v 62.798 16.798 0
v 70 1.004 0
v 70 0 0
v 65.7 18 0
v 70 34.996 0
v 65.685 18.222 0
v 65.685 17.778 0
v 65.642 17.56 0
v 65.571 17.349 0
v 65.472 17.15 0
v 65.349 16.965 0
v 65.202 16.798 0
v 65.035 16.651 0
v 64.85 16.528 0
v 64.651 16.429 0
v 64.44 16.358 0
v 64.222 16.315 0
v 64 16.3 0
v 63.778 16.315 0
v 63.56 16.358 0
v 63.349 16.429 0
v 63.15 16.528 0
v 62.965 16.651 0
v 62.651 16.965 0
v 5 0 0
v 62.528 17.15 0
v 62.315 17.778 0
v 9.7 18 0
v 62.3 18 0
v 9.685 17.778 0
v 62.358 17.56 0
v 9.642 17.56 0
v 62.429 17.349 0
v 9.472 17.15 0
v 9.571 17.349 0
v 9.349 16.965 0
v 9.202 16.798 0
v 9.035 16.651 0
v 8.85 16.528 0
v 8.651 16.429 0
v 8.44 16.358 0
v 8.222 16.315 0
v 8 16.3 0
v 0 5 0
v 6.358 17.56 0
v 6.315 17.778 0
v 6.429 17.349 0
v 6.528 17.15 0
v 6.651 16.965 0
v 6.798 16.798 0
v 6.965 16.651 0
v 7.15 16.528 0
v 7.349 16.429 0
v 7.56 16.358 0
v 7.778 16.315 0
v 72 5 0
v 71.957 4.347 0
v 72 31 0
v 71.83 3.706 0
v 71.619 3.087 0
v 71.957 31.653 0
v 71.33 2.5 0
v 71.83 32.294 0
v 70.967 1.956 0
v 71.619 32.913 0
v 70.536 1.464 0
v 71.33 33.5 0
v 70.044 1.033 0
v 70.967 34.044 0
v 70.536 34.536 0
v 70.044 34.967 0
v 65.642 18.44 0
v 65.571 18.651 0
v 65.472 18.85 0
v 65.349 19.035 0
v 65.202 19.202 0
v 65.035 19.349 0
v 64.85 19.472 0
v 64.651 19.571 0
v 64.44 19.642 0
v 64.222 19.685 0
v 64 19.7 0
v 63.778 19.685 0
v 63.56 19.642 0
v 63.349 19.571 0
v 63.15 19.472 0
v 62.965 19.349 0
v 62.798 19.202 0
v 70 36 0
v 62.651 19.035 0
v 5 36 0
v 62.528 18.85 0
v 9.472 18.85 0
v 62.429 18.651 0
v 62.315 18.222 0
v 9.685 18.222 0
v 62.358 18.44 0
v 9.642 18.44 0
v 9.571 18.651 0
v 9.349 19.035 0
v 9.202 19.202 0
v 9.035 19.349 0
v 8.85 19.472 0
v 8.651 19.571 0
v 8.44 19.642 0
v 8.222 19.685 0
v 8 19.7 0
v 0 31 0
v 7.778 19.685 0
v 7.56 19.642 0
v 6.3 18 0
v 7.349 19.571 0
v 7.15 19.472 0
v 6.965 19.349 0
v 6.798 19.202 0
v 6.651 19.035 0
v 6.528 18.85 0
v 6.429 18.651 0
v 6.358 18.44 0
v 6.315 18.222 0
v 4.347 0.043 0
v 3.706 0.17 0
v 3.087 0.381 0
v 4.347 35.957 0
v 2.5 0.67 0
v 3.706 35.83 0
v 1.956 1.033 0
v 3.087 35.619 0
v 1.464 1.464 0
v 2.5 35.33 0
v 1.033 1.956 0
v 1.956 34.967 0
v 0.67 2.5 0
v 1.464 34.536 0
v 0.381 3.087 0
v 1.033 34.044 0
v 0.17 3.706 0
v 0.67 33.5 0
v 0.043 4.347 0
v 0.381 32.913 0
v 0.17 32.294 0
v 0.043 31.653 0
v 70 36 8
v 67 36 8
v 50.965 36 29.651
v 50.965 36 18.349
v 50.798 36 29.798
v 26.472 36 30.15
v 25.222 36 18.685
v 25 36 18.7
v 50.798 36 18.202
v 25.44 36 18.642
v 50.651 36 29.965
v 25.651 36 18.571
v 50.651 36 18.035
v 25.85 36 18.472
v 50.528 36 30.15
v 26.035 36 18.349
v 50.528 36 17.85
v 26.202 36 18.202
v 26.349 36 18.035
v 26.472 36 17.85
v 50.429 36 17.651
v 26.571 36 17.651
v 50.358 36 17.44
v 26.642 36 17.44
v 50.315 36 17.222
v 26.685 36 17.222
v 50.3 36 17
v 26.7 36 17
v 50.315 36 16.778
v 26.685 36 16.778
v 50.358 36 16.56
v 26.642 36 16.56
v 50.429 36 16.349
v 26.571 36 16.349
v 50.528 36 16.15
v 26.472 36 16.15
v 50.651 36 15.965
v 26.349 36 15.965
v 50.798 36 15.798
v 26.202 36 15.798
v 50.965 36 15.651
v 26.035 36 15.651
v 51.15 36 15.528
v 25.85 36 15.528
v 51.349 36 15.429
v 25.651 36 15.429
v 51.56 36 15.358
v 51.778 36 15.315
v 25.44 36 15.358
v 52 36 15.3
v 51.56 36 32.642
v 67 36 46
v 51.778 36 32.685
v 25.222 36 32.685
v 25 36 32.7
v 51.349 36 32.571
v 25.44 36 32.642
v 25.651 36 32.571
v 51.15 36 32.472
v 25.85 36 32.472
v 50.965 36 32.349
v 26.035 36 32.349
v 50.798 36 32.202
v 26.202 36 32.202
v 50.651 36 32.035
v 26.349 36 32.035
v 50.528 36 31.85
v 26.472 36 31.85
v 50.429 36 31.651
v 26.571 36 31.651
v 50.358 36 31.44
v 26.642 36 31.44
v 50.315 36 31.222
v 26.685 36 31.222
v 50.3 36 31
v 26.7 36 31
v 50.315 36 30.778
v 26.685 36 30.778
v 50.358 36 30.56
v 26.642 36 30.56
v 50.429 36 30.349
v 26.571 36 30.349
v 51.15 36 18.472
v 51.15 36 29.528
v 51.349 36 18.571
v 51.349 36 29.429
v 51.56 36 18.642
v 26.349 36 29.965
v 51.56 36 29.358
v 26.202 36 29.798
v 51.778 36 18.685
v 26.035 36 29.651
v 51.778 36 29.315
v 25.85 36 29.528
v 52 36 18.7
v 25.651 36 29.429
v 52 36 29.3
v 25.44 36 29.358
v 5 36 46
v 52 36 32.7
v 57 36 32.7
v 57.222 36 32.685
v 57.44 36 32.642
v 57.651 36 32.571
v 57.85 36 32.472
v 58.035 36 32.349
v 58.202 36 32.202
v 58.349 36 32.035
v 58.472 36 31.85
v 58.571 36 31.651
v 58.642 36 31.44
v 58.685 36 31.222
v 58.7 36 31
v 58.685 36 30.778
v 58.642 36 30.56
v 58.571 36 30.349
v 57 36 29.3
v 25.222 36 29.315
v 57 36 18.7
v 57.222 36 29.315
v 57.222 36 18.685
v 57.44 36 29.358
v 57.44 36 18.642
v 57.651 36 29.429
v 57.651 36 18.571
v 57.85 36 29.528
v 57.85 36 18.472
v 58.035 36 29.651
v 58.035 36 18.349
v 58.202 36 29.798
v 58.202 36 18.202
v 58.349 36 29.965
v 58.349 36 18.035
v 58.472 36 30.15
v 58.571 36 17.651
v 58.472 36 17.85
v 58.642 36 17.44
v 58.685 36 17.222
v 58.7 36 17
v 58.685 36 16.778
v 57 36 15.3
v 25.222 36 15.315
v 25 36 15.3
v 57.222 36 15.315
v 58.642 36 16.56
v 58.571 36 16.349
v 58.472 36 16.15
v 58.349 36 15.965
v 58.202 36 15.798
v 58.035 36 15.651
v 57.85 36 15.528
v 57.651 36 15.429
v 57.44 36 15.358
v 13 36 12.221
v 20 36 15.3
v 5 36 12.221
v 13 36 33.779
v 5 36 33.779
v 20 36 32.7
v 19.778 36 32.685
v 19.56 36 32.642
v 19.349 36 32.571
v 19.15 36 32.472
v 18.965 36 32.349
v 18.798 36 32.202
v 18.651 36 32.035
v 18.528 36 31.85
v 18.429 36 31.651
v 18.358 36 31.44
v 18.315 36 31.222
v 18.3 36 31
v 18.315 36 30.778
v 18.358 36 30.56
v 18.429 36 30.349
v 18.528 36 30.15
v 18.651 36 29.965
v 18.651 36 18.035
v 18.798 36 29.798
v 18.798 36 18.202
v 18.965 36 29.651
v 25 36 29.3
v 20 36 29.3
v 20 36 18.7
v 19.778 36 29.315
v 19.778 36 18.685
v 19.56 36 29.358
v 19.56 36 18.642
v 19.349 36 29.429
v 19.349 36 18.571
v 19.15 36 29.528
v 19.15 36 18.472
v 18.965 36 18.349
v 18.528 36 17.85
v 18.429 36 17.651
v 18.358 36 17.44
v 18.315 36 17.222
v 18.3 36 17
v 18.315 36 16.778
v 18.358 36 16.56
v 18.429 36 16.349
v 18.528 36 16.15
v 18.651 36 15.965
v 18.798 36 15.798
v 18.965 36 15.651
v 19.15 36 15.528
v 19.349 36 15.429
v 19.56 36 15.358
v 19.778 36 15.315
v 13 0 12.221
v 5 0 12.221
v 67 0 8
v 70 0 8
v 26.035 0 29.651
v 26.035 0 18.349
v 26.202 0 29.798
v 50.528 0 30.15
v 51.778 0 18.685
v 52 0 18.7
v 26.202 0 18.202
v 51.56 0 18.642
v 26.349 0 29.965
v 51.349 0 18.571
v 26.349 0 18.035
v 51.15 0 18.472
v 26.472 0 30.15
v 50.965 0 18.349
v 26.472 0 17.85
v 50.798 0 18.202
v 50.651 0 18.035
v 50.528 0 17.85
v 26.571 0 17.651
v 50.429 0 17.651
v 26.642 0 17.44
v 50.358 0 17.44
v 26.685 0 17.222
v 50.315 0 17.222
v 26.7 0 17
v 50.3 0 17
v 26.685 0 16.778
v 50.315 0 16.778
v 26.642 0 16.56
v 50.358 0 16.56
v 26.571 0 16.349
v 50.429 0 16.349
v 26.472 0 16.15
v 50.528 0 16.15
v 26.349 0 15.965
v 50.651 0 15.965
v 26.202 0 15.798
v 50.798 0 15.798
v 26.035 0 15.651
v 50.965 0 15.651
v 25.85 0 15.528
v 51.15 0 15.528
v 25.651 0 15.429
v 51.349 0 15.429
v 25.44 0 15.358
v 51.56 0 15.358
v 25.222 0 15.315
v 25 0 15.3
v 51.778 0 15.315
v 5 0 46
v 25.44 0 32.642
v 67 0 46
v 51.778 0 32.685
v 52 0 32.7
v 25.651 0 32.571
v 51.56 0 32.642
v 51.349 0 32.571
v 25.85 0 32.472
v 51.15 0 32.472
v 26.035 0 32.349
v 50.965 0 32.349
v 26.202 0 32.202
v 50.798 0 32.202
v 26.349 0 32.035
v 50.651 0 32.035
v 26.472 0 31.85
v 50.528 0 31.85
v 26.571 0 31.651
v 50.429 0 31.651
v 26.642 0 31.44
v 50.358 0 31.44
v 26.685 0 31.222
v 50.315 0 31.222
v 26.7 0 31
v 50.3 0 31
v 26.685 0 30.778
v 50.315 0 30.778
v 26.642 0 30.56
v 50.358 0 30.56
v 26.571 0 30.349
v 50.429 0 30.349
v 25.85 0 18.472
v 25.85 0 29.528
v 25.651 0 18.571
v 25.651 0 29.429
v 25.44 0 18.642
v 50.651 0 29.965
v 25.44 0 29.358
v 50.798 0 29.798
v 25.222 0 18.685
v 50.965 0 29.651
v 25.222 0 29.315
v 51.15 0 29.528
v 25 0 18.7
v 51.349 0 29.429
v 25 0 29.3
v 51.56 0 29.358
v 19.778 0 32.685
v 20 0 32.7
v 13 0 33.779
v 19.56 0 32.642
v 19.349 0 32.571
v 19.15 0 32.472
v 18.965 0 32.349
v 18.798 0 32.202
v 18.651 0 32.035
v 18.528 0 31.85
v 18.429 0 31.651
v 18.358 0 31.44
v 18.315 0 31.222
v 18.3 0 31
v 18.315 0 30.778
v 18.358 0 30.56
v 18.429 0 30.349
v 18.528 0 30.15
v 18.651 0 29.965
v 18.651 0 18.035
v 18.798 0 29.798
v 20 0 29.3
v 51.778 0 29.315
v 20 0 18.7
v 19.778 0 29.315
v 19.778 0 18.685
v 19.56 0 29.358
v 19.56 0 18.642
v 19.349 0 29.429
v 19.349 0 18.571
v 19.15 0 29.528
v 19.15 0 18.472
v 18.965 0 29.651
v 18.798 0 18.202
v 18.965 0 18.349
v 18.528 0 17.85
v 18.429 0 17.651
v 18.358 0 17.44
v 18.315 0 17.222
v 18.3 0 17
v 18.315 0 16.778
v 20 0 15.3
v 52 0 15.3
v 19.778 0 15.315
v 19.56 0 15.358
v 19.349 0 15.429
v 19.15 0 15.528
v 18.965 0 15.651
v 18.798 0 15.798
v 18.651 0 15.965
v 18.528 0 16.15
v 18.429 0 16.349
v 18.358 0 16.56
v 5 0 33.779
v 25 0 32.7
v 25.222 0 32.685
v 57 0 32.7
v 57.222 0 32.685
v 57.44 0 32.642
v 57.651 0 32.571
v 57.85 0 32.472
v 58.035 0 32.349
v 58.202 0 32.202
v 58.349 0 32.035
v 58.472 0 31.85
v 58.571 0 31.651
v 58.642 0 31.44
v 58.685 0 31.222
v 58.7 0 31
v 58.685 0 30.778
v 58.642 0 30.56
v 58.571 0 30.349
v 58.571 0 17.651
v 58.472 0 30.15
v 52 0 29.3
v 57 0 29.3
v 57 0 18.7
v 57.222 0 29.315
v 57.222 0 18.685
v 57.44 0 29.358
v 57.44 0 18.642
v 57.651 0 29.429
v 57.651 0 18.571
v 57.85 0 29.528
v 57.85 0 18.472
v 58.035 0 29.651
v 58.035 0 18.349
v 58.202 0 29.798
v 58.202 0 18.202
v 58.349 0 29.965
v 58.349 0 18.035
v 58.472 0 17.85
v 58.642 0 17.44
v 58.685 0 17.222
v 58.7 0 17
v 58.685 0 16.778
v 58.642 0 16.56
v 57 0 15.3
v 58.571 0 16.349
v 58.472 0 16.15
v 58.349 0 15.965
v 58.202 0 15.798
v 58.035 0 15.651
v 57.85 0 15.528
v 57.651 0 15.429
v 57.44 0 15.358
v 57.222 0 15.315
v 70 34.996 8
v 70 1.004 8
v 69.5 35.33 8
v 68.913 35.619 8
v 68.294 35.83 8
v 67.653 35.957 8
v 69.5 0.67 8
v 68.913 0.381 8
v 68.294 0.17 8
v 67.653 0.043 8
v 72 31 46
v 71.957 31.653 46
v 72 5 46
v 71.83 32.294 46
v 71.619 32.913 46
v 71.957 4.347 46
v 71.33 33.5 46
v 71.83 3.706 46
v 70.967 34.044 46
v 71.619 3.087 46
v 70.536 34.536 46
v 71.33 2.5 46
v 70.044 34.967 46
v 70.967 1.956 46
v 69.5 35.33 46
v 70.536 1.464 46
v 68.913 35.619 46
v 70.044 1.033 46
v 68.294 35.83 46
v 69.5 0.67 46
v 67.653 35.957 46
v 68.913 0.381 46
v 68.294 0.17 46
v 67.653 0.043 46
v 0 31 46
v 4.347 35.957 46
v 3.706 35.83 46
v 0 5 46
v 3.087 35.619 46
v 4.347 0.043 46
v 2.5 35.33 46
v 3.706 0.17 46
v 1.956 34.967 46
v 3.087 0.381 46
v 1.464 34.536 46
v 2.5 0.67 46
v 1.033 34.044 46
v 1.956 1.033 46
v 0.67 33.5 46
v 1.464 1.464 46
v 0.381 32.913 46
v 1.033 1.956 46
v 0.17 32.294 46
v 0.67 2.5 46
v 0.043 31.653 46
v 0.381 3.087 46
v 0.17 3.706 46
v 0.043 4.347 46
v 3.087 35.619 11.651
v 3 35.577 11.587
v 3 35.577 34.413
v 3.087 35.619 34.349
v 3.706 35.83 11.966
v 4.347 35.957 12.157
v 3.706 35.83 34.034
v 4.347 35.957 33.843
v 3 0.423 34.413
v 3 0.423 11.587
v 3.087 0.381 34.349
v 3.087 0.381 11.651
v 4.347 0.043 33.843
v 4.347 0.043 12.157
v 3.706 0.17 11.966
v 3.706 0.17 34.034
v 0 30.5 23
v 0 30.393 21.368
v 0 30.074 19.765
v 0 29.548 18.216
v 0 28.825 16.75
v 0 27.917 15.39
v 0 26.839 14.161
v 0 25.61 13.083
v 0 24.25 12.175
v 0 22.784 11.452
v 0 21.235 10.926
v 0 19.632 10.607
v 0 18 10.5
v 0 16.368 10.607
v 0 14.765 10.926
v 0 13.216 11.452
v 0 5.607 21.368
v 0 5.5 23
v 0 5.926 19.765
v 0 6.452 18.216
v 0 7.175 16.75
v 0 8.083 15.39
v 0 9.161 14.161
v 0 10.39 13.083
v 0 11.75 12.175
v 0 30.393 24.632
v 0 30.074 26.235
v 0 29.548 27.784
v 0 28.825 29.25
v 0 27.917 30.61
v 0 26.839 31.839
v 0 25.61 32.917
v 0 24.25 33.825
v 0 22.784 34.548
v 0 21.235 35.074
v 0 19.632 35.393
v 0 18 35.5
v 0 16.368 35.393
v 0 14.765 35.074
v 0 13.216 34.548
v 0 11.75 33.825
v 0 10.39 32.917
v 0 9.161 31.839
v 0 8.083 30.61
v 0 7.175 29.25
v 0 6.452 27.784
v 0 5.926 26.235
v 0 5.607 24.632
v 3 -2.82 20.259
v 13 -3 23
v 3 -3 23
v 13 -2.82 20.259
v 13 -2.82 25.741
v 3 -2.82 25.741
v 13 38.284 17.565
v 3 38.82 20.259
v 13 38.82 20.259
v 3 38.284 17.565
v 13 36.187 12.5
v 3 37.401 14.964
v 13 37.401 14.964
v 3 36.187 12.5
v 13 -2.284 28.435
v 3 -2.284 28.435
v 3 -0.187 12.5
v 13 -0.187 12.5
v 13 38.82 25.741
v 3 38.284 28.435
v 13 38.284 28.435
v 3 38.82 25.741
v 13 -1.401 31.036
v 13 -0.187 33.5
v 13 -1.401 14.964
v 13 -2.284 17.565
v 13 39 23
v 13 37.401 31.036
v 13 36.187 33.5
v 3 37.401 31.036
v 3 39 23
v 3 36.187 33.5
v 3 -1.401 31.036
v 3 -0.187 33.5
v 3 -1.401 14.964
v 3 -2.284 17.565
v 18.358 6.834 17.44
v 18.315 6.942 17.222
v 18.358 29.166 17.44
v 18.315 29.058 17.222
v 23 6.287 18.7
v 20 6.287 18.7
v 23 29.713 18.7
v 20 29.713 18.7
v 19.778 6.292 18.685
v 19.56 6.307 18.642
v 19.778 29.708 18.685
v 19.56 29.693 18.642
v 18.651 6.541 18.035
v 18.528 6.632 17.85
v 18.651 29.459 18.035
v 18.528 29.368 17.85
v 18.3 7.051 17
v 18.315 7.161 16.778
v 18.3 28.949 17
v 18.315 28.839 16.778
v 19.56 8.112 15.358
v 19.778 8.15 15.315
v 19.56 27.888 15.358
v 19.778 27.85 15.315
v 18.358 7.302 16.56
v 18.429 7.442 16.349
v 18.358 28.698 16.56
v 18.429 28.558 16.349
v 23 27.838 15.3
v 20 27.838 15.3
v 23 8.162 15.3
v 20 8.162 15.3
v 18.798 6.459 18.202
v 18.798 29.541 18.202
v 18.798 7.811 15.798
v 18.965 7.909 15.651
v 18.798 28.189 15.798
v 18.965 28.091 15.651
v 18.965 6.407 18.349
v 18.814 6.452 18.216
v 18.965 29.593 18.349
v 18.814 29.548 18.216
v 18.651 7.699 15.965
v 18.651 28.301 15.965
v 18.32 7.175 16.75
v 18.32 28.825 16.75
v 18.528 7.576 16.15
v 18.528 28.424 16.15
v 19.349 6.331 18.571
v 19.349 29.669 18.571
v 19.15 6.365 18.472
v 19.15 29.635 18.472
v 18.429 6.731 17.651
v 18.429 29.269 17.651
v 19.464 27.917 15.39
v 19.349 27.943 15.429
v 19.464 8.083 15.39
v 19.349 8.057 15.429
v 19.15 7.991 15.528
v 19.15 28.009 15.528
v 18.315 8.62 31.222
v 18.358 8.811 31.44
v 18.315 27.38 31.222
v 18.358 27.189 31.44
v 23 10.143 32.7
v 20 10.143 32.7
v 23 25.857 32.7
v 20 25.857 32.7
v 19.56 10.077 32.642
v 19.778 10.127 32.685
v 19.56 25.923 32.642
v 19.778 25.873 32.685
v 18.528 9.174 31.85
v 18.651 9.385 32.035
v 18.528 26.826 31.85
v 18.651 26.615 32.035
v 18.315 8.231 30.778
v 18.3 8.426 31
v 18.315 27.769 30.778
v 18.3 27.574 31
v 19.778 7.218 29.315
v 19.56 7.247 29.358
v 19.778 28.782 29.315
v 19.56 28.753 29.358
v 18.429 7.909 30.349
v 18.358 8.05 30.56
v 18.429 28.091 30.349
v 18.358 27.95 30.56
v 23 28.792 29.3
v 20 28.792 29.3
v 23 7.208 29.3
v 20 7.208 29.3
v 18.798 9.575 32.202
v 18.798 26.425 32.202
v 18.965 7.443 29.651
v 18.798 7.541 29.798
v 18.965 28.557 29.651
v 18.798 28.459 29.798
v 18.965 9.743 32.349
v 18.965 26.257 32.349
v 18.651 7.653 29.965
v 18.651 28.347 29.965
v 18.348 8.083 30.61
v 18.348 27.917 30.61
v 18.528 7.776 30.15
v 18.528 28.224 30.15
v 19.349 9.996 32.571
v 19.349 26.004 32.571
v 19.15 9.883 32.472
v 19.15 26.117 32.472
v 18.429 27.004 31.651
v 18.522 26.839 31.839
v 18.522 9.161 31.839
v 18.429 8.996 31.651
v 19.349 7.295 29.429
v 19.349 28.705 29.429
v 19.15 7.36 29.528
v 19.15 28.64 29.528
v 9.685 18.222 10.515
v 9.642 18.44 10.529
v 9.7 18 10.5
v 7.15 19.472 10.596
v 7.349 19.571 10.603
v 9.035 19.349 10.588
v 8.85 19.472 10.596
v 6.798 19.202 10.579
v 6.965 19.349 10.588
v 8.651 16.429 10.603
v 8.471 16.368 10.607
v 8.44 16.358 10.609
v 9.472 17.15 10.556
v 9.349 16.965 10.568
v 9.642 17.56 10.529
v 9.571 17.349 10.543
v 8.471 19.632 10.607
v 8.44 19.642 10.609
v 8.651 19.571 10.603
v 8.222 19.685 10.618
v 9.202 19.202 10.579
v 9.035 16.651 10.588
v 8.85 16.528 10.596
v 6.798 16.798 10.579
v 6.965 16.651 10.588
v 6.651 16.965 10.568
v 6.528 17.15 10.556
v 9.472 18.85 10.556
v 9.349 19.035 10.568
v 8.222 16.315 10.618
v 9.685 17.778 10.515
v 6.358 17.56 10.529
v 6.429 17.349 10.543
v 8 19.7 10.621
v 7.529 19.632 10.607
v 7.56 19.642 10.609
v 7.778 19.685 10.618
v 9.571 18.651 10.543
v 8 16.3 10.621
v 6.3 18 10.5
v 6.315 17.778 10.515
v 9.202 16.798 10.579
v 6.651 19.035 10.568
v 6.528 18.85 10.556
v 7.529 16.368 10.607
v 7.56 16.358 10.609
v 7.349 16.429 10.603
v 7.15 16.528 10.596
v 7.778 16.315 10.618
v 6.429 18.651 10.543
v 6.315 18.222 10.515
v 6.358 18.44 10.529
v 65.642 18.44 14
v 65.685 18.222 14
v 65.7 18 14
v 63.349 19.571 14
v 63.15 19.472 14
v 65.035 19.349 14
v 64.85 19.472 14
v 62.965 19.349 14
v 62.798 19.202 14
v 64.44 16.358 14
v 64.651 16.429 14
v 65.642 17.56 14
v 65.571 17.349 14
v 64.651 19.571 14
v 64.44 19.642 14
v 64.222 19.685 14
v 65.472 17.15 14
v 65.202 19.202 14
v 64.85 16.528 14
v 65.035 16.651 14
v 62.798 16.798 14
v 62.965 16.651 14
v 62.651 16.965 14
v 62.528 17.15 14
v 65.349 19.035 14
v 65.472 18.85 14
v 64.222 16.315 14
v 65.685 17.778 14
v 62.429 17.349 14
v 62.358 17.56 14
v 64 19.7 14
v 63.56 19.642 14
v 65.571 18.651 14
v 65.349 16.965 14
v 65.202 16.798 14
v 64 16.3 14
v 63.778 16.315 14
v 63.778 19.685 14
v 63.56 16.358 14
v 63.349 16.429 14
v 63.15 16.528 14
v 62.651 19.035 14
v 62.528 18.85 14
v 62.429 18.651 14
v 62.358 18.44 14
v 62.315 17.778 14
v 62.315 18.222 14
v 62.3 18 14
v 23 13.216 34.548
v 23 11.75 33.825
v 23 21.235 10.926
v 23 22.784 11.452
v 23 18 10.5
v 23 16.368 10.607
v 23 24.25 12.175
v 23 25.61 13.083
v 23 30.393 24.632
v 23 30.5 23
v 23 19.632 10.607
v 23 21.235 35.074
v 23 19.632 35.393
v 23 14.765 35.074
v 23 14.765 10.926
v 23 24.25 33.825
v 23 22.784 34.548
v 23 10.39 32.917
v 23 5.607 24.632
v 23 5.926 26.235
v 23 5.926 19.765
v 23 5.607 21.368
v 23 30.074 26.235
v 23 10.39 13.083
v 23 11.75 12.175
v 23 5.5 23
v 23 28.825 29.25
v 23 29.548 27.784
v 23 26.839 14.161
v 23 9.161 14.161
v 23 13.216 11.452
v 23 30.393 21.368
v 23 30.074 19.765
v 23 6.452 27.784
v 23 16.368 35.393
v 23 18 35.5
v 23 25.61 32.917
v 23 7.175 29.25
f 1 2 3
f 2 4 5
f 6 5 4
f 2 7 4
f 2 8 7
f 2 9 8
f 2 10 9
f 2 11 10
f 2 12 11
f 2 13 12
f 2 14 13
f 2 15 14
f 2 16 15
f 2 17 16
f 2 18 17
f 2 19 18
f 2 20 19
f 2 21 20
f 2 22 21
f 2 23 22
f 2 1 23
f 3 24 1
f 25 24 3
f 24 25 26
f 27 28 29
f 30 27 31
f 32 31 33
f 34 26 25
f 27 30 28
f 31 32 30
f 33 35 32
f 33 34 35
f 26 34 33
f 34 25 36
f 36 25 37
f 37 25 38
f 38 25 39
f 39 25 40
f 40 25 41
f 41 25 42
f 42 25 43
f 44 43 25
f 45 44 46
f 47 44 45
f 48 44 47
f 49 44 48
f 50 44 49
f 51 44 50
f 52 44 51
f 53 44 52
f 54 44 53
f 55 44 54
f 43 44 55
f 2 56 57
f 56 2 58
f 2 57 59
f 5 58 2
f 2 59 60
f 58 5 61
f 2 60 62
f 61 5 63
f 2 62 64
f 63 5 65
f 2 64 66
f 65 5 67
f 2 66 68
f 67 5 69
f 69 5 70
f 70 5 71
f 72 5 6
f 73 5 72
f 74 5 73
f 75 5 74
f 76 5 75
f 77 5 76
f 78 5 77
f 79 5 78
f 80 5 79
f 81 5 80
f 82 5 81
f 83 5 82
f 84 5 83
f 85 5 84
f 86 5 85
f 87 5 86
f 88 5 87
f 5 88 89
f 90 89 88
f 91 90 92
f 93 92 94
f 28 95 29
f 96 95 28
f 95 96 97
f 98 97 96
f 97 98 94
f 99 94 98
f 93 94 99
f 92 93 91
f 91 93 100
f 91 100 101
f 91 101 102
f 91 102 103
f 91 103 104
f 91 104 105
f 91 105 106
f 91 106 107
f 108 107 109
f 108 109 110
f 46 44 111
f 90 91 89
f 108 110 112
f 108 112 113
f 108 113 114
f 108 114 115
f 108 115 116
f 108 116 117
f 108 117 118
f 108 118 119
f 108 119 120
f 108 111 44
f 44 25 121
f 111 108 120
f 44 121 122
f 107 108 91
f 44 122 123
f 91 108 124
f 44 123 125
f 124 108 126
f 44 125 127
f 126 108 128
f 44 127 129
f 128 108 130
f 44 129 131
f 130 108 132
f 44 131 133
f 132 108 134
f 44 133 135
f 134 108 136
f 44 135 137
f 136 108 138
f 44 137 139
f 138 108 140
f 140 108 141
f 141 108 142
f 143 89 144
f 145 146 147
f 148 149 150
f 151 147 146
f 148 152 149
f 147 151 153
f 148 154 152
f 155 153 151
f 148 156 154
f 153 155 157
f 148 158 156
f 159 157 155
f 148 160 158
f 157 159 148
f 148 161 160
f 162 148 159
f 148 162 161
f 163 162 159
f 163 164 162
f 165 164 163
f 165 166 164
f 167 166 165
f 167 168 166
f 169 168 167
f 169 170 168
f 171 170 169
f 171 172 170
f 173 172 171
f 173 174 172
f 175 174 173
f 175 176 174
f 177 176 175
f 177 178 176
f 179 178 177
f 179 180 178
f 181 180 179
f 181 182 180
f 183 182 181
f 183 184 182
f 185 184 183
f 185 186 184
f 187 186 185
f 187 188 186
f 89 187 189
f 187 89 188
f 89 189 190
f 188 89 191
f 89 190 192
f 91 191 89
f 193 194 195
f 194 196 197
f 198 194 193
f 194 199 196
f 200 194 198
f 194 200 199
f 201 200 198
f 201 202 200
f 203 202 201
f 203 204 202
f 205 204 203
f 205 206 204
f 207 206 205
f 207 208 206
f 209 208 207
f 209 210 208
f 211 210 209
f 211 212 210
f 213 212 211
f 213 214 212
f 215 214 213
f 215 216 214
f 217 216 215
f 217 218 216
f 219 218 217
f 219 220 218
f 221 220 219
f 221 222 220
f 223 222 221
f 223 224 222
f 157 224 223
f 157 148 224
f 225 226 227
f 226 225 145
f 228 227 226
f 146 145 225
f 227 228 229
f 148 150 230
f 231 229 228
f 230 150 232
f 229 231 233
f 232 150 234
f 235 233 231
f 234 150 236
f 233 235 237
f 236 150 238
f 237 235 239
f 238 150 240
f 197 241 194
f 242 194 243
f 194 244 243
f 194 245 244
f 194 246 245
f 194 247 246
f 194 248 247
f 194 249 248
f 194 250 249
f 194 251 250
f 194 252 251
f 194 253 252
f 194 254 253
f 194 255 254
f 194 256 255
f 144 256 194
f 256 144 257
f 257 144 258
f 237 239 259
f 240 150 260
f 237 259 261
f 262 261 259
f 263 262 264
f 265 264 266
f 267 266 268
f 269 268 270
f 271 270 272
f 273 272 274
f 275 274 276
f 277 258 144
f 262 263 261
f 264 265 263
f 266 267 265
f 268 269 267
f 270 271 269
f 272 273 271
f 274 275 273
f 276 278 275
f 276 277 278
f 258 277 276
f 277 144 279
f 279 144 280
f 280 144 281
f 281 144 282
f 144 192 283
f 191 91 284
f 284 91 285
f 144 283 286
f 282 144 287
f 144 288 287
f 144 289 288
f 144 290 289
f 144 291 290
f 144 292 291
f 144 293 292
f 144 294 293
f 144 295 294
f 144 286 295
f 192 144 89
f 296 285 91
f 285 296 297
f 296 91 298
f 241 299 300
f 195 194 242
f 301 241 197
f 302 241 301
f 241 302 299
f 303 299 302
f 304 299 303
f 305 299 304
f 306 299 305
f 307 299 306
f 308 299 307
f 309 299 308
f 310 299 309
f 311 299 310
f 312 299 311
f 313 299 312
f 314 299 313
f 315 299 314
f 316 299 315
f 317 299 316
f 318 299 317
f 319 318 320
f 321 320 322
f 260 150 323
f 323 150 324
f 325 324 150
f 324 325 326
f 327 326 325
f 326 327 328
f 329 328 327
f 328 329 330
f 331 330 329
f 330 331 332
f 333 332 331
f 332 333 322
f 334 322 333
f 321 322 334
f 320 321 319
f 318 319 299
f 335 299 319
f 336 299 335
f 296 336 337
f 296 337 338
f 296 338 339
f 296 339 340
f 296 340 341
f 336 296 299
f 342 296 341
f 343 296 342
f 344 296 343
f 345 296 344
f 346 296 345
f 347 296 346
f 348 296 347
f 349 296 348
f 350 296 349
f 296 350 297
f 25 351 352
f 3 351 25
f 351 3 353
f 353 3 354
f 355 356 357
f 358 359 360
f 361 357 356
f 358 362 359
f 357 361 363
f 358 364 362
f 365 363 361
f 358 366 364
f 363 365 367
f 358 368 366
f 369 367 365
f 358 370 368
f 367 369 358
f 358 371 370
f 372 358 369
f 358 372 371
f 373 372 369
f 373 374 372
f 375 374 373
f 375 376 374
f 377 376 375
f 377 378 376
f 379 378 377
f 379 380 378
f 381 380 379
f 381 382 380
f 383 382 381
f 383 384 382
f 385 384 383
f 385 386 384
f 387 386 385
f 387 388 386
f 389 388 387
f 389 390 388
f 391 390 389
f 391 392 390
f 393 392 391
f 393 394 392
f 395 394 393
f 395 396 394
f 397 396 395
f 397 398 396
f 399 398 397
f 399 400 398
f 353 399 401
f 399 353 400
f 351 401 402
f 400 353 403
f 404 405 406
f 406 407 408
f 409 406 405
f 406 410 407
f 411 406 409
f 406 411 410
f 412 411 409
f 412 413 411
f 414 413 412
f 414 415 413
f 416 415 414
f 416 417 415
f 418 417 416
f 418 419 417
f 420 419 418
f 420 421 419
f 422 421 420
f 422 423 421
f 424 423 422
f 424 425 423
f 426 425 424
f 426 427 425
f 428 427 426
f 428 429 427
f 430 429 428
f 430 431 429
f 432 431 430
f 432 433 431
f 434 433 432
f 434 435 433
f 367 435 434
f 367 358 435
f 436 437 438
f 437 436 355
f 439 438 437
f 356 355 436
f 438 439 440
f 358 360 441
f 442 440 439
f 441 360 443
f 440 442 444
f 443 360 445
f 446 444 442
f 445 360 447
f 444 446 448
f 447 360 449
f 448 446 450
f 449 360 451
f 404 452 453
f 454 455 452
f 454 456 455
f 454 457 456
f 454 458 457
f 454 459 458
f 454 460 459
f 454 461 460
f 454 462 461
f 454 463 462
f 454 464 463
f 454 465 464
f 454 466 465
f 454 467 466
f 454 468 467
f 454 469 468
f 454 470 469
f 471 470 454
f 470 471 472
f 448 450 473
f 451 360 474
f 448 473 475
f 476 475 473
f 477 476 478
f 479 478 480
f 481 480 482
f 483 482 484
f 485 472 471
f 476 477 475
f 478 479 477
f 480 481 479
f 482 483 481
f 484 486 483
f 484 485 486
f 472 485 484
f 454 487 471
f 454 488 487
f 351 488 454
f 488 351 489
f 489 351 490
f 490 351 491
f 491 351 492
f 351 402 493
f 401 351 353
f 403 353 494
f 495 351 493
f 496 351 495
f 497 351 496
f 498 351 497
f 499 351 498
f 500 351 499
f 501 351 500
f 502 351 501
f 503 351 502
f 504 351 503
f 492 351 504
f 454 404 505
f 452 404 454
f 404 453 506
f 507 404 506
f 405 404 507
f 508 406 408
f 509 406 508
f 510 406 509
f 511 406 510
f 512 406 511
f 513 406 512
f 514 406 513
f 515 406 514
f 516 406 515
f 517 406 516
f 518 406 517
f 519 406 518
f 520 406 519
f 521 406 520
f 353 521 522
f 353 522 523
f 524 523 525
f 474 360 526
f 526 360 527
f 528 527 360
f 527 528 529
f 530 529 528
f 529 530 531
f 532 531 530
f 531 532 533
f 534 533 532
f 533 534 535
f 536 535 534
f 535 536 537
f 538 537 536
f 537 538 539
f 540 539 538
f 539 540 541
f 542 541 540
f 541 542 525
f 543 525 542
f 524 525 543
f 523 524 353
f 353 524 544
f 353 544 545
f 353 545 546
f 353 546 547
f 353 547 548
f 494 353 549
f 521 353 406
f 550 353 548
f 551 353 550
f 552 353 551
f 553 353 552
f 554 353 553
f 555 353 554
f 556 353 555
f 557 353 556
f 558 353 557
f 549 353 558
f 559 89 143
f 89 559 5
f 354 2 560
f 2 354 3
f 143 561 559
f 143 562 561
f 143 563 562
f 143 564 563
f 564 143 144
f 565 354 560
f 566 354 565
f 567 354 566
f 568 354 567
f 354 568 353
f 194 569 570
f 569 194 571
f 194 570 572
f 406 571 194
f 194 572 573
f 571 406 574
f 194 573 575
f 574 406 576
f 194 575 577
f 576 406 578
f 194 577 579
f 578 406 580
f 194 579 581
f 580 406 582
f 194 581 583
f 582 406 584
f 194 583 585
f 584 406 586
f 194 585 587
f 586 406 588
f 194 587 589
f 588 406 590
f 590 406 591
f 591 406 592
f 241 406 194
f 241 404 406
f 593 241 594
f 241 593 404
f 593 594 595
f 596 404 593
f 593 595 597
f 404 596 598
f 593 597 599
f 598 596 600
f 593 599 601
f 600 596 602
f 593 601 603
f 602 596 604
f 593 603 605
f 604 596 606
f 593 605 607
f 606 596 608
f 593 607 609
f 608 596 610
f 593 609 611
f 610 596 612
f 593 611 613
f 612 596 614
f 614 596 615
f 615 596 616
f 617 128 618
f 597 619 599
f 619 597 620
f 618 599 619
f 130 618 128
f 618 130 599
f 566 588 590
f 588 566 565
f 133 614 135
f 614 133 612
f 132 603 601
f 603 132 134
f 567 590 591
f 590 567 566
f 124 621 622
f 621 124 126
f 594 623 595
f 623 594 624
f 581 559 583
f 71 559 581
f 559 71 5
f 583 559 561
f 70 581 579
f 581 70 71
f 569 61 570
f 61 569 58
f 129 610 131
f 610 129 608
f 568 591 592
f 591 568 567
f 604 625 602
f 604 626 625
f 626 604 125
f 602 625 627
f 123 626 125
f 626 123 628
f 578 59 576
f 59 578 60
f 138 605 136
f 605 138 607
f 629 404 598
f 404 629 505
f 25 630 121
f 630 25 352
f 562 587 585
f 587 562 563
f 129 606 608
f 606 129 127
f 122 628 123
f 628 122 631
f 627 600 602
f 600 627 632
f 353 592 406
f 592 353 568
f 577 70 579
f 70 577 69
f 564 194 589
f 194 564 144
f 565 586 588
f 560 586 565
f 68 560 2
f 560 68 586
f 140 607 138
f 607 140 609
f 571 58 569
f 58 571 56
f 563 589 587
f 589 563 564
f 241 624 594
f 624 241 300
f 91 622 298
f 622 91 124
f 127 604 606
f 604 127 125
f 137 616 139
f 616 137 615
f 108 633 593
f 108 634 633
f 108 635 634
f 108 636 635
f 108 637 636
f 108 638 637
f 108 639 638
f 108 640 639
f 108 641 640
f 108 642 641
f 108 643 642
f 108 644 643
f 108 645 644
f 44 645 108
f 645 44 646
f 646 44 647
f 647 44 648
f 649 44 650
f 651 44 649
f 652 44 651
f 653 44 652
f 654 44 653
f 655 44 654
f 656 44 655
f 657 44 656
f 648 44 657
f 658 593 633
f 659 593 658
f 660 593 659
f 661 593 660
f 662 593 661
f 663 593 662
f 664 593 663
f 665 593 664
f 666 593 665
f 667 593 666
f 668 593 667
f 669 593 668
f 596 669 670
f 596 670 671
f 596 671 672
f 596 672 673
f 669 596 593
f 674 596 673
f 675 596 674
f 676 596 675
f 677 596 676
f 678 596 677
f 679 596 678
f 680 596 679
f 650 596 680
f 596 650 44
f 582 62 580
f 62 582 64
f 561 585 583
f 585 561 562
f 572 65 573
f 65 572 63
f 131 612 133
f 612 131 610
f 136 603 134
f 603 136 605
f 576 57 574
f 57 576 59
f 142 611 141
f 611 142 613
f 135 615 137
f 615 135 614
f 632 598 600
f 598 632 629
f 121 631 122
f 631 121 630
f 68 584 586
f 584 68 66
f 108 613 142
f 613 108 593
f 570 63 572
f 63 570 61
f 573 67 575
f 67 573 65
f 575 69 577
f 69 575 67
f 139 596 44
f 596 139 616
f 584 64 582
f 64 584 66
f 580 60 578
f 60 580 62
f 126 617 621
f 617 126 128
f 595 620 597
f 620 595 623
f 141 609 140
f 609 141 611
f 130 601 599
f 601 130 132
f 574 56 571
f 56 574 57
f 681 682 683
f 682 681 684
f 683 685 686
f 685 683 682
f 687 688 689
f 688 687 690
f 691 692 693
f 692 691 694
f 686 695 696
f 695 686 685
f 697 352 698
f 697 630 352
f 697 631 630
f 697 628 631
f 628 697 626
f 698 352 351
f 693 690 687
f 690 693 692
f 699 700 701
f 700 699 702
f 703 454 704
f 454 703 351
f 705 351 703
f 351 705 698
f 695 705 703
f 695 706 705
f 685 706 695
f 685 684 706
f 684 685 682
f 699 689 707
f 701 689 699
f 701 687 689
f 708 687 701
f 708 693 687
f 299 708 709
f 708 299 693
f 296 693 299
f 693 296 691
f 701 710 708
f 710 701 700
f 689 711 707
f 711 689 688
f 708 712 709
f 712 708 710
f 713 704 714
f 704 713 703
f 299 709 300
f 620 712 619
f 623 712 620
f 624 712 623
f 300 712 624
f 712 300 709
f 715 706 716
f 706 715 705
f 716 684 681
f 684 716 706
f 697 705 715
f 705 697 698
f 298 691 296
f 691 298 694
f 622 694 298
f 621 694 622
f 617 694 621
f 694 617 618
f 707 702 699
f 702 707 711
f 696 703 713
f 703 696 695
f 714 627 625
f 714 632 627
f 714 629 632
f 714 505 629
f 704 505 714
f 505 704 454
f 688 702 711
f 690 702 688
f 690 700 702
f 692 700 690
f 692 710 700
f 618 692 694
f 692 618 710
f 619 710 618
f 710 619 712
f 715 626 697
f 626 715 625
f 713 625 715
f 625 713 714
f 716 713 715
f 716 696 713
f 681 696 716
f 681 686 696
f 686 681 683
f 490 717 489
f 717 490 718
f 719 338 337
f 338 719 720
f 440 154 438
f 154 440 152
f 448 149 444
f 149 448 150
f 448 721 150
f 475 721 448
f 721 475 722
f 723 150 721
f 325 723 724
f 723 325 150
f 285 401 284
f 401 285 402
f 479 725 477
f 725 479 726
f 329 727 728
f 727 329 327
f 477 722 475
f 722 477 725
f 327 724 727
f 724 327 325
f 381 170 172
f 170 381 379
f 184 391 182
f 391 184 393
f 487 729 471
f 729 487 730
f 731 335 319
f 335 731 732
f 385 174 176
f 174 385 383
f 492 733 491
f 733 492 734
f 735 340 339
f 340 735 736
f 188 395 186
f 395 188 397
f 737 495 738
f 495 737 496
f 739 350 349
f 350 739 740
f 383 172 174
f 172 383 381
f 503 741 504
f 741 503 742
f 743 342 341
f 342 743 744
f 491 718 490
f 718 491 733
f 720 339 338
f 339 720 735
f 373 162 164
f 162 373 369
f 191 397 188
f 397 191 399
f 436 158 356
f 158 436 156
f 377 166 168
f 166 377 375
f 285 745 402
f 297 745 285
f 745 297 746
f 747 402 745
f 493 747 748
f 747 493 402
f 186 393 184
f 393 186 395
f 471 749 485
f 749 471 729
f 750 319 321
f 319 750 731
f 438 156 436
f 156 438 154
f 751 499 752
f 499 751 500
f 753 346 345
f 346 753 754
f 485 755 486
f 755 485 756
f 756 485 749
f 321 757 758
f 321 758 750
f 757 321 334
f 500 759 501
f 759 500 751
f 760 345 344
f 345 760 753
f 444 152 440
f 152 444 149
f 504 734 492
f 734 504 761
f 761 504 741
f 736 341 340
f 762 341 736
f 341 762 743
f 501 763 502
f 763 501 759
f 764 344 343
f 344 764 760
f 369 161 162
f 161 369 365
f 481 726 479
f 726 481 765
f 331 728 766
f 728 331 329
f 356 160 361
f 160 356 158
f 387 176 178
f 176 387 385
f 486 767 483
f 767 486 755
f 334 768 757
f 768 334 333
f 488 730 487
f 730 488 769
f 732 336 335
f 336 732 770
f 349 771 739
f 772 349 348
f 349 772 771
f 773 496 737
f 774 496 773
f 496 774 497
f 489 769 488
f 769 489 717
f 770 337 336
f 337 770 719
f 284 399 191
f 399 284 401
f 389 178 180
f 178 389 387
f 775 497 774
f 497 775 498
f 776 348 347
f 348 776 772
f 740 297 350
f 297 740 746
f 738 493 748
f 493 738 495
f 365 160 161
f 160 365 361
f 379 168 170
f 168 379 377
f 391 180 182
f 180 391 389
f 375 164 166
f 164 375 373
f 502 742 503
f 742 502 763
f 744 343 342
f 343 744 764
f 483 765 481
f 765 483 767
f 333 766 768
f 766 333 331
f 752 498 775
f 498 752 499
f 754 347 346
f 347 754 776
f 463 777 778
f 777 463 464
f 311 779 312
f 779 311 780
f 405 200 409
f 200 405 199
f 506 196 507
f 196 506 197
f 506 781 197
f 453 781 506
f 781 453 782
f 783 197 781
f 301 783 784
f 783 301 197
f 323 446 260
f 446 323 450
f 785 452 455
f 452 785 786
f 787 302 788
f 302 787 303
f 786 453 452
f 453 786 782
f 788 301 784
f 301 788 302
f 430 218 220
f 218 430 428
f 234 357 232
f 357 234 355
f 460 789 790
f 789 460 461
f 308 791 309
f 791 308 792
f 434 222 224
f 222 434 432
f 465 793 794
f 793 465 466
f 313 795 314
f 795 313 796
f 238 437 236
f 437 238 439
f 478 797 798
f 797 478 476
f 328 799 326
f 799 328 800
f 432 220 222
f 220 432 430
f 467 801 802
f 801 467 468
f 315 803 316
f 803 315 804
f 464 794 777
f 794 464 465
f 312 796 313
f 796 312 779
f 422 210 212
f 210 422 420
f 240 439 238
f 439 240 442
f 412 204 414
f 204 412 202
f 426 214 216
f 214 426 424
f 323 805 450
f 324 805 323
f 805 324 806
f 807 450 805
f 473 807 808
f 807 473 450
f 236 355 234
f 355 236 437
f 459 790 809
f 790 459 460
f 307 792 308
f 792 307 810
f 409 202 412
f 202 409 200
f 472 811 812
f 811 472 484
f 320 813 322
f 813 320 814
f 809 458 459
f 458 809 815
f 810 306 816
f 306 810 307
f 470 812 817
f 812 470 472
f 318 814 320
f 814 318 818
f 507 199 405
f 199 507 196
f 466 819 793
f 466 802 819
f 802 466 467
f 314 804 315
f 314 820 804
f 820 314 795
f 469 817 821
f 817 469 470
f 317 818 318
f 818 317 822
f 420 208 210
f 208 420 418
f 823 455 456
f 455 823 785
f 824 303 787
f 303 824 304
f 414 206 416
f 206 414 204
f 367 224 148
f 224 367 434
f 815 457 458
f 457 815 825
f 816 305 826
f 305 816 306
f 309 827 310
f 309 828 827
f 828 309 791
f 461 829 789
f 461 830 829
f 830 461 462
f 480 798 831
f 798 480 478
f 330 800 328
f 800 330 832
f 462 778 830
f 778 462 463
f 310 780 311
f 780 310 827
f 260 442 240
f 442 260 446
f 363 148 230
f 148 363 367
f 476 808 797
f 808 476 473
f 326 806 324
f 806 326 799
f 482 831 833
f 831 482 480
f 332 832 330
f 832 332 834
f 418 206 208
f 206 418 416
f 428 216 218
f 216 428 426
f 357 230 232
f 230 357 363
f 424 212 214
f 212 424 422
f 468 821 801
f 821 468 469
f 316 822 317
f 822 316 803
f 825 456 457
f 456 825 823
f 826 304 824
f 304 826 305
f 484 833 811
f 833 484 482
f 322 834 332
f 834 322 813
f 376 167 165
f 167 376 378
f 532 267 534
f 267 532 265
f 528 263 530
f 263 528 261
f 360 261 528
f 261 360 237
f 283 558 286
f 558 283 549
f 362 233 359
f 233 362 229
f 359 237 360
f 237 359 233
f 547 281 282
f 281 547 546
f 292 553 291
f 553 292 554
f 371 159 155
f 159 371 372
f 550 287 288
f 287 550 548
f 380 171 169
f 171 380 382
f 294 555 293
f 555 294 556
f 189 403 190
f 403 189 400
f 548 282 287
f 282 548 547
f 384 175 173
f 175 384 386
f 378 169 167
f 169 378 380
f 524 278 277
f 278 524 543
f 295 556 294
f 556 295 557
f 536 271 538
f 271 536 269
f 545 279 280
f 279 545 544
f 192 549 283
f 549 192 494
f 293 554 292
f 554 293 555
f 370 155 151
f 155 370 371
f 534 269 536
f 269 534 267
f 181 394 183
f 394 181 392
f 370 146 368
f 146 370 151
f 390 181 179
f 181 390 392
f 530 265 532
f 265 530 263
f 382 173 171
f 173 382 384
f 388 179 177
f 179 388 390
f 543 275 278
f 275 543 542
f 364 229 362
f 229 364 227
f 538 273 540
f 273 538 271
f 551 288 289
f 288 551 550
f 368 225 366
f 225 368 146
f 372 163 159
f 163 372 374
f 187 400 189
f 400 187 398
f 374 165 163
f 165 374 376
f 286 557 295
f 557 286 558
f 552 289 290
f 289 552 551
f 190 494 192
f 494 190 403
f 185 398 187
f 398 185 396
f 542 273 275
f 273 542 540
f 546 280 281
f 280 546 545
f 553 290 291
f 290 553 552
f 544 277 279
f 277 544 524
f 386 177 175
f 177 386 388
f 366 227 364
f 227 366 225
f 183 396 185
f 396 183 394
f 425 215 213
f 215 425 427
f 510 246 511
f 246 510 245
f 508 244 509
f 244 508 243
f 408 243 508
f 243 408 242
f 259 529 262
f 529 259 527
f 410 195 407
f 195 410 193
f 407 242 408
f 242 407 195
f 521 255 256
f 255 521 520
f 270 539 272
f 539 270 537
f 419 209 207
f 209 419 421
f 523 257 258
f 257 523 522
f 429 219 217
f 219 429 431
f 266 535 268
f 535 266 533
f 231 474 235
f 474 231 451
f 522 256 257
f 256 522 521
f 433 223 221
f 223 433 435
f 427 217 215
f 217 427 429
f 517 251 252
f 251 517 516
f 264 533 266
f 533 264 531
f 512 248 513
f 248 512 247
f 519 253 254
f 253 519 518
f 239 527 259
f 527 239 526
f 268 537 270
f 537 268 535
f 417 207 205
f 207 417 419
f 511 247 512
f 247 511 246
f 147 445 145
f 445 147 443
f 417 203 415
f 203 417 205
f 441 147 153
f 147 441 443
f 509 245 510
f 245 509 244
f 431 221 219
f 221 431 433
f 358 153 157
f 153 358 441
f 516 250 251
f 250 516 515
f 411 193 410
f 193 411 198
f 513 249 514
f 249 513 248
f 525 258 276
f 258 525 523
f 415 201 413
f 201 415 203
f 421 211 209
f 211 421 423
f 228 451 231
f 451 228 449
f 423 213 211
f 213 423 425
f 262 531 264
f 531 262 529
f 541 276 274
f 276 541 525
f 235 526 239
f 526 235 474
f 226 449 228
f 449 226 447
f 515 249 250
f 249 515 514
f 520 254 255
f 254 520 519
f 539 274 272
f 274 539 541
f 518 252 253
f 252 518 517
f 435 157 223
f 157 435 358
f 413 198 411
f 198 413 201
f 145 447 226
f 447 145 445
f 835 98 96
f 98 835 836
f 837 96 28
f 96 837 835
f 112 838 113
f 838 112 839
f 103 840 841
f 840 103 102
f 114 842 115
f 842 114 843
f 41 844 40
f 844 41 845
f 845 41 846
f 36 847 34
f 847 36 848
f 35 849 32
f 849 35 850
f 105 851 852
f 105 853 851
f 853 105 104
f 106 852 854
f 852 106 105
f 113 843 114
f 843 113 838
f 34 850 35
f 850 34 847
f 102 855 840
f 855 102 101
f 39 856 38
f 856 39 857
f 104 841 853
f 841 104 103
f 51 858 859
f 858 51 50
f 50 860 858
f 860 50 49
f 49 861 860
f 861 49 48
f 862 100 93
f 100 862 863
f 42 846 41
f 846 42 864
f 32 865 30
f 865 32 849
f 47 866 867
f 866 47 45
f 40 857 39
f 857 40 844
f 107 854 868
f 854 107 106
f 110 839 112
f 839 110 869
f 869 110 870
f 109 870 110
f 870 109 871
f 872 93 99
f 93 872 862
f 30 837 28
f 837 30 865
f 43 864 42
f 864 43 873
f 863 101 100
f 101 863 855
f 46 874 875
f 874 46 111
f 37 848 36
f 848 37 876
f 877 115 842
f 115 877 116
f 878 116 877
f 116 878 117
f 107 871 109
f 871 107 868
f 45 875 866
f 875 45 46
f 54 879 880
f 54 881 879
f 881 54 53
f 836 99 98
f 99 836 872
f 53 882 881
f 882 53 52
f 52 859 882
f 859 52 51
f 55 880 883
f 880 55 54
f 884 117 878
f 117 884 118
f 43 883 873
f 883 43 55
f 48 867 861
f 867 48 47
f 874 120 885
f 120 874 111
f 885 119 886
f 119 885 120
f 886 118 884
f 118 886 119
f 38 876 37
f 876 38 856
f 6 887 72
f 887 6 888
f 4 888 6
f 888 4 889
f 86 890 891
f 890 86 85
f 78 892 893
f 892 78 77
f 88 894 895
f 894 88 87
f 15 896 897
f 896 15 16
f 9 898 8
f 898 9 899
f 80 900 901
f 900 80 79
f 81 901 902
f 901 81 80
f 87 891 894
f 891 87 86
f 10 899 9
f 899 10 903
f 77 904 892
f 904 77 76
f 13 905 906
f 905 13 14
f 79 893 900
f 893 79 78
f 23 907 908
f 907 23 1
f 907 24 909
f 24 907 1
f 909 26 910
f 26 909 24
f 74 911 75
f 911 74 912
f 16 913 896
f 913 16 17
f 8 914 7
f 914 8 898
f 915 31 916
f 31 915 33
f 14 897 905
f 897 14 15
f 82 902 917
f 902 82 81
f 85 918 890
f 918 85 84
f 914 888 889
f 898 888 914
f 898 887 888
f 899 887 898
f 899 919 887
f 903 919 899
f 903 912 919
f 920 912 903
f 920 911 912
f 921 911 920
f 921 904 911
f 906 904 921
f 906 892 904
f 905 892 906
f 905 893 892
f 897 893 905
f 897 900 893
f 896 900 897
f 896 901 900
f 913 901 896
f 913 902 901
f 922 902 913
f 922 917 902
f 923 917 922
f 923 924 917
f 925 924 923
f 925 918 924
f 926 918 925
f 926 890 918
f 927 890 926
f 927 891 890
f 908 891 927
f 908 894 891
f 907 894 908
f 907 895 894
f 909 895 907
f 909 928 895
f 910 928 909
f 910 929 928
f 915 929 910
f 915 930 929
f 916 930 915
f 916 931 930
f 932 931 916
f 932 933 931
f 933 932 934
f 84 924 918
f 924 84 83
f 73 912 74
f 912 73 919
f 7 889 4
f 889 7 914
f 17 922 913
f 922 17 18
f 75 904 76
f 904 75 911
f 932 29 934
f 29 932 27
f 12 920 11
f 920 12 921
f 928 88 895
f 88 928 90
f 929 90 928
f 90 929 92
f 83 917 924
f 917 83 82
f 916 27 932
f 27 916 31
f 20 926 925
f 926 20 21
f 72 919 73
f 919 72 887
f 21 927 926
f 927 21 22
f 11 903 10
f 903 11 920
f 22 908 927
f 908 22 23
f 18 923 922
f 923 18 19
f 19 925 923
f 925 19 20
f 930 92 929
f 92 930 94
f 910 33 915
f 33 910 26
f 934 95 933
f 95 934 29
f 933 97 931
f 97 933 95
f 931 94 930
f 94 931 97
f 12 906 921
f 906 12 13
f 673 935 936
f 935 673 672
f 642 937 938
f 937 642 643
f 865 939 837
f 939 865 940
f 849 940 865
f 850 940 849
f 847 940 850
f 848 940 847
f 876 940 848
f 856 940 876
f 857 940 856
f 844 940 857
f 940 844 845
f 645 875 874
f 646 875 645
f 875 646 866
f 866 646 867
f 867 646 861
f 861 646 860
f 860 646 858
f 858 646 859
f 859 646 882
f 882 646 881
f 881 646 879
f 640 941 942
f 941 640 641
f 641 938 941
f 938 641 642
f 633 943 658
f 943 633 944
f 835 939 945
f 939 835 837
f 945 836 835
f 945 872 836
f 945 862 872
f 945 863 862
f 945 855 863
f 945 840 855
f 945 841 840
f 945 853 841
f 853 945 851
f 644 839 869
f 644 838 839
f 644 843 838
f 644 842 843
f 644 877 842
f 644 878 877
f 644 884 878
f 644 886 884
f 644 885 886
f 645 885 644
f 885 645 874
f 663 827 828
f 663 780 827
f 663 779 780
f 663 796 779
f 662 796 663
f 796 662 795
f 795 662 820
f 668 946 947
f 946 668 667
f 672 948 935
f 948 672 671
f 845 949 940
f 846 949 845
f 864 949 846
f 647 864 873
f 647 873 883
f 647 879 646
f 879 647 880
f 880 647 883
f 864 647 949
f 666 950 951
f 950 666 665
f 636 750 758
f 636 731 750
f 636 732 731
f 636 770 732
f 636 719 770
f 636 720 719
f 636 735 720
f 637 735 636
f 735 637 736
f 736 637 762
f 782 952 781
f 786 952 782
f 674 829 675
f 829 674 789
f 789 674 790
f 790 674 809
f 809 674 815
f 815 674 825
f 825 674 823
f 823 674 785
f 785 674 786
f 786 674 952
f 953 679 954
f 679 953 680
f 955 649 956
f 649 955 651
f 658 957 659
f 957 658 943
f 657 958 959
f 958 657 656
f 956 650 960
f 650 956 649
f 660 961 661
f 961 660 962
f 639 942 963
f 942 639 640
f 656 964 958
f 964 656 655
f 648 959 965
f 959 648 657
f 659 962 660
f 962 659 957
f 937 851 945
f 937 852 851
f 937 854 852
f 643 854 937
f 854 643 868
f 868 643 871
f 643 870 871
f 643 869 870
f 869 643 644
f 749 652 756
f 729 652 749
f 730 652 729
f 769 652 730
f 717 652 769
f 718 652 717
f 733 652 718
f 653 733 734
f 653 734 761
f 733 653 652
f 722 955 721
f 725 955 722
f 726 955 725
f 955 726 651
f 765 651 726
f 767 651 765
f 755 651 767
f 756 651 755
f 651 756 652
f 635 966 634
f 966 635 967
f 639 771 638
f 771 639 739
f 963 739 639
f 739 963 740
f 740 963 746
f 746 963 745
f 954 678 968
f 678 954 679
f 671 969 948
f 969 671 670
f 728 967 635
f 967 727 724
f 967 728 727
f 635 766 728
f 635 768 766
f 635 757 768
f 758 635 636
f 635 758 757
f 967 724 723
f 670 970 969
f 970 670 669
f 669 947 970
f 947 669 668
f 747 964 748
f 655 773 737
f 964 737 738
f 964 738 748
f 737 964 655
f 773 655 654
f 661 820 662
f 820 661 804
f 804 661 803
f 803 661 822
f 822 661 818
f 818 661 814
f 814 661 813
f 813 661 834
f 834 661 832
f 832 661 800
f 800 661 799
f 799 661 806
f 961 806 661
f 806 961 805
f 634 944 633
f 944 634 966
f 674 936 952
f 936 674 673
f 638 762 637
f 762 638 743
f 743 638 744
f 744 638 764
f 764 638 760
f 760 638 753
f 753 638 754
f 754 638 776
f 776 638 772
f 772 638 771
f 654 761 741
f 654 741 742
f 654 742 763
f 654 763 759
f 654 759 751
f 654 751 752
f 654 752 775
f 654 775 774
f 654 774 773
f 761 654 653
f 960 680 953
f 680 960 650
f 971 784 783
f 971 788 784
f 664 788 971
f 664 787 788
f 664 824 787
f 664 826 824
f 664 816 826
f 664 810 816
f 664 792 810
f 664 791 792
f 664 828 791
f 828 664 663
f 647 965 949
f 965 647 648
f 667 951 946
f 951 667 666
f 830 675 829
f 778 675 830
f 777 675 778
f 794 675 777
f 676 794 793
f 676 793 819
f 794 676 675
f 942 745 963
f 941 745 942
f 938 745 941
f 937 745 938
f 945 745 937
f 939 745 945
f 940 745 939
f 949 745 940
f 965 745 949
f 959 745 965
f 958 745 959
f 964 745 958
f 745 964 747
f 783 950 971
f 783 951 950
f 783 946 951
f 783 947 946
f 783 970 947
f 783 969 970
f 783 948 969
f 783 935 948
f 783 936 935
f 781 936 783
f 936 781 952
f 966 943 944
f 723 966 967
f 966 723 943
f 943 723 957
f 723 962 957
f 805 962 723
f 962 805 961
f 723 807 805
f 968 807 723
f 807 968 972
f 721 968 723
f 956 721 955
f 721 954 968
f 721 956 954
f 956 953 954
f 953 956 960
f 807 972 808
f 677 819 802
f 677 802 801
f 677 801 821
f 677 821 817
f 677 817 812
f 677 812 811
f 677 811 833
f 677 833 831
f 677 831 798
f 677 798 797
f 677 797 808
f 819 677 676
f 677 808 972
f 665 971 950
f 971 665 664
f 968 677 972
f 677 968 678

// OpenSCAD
// file: robot_params.scad
// Shared mechanical parameters for Codex house companion CAD v0.
// Units: millimeters.
$fn = 48;

// Body envelope
base_len = 300;
base_w = 220;
base_floor_th = 4;
wall_th = 3;
corner_r = 12;
base_wall_h = 34;
deck_z = 48;
total_body_h = 112;

// Personality / render colors
codex_teal = "#13C8C3";
codex_blue = "#2F6BFF";
codex_cream = "#F5F0E6";
codex_charcoal = "#242832";
codex_lime = "#B9FF66";
codex_orange = "#FF9F1C";
bumper_tpu = "#2B2F3A";

// Drive
wheel_d = 80;
wheel_w = 24;
axle_z = 42;
axle_x = 145;
wheel_clearance = 5;
motor_mount_slot = 5;
motor_pod_len = 72;
motor_pod_w = 36;
motor_pod_h = 46;

// Fasteners
m3_clearance_d = 3.4;
m3_insert_d = 4.8;
m3_insert_depth = 5.7;
m25_clearance_d = 2.8;
m2_clearance_d = 2.3;

// Electronics
pi_len = 85;
pi_w = 56;
pi_mount_x = 58;
pi_mount_y = 49;
hat_keepout_z = 28;
cooling_keepout_z = 18;
deck_th = 4;
deck_offset_x = 18;
deck_offset_y = 14;
deck_mount_x = [24, base_len-60];
deck_mount_y = [20, base_w-62];
deck_boss_x = [deck_offset_x + deck_mount_x[0], deck_offset_x + deck_mount_x[1]];
deck_boss_y = [deck_offset_y + deck_mount_y[0], deck_offset_y + deck_mount_y[1]];
deck_len = base_len - 36;
deck_w = base_w - 42;

// Battery
battery_len = 110;
battery_w = 38;
battery_h = 38;
battery_padding = 3;
strap_slot_w = 8;
strap_slot_len = 46;
battery_cradle_mount_x = [12, battery_len + 2*battery_padding + 2];
battery_cradle_mount_y = [10, battery_w + 2*battery_padding + 2];

// Storage keepout for later USB 3 module
usb_storage_len = 90;
usb_storage_w = 35;
usb_storage_h = 12;
usb_cable_bend_r = 25;

// Sensors and expression
head_z = 205;
mast_h = 120;
mast_w = 38;
mast_d = 32;
head_w = 96;
head_h = 58;
head_d = 46;
camera_board_w = 25;
camera_board_h = 24;
tof_pod_w = 24;
tof_pod_h = 18;
tof_pod_d = 18;
front_sensor_angle = 20;
bumper_travel = 8;
soft_bumper_h = 22;

// Assembly anchors / safety placeholders
battery_cradle_x = 166;
battery_cradle_y = base_w/2 - (battery_w + 2*battery_padding + 12)/2;
motor_pod_anchor_x = [axle_x-28, axle_x+28];
motor_pod_anchor_y = [base_w/2 - 61, base_w/2 + 61];
motor_pod_local_hole_x = [8, 64];
motor_pod_local_hole_y = motor_pod_w/2;
estop_x = base_len - 62;
estop_y = base_w/2;
estop_mount_d = 22;
estop_guard_d = 48;
estop_plate_w = 70;
estop_plate_d = 62;
estop_plate_th = 5;
estop_plate_mount_x = [10, estop_plate_w - 10];
estop_plate_mount_y = [10, estop_plate_d - 10];

// Split-print helpers for common 220 x 220 mm beds
base_split_x = base_len/2;
deck_split_x = deck_len/2;
seam_screw_offset = 14;
base_seam_y = [42, base_w/2, base_w-42];
deck_seam_y = [36, deck_w/2, deck_w-36];
seam_plate_w = 64;
seam_plate_d = 18;
seam_plate_th = 3;

module rounded_box(size=[10,10,10], r=2, center=false) {
  // Lightweight printable rounded rectangle prism using hull of cylinders.
  translate(center ? [-size[0]/2, -size[1]/2, -size[2]/2] : [0,0,0])
  hull() {
    for (x=[r, size[0]-r]) for (y=[r, size[1]-r])
      translate([x,y,0]) cylinder(h=size[2], r=r);
  }
}

module screw_hole(d=m3_clearance_d, h=20) {
  cylinder(h=h, d=d, center=true);
}

module preview_only() {
  if ($preview) children();
}

module insert_boss(d=10, h=8, hole=m3_insert_d) {
  difference() { cylinder(h=h, d=d); translate([0,0,-1]) cylinder(h=h+2, d=hole); }
}
// main file
include <robot_params.scad>
module motor_pod(side=1) {
  color(codex_charcoal)
  difference(){
    union(){
      rounded_box([motor_pod_len,motor_pod_w,motor_pod_h],5);
      translate([8,motor_pod_w/2,motor_pod_h/2]) rotate([0,90,0]) cylinder(h=10,d=42,center=true);
      for (x=[12,motor_pod_len-12]) translate([x,0,0]) cube([10,motor_pod_w,8]);
      for (x=[18,motor_pod_len-18]) translate([x,motor_pod_w/2,8]) cylinder(h=motor_pod_h-8,d1=12,d2=8);
    }
    translate([8,motor_pod_w/2,motor_pod_h/2]) rotate([0,90,0]) cylinder(h=30,d=25,center=true);
    for (x=[20,motor_pod_len-20]) for (z=[17,31]) translate([x,motor_pod_w/2,z]) rotate([90,0,0]) hull(){ cylinder(h=50,d=m3_clearance_d,center=true); translate([motor_mount_slot,0,0]) cylinder(h=50,d=m3_clearance_d,center=true); }
    for (x=motor_pod_local_hole_x) translate([x,motor_pod_local_hole_y,4]) screw_hole(h=20);
  }
  %translate([8, side*(motor_pod_w/2+wheel_w/2+wheel_clearance), axle_z-motor_pod_h/2]) rotate([90,0,0]) color([0.05,0.05,0.05,0.35]) cylinder(h=wheel_w,d=wheel_d,center=true);
}
motor_pod();
